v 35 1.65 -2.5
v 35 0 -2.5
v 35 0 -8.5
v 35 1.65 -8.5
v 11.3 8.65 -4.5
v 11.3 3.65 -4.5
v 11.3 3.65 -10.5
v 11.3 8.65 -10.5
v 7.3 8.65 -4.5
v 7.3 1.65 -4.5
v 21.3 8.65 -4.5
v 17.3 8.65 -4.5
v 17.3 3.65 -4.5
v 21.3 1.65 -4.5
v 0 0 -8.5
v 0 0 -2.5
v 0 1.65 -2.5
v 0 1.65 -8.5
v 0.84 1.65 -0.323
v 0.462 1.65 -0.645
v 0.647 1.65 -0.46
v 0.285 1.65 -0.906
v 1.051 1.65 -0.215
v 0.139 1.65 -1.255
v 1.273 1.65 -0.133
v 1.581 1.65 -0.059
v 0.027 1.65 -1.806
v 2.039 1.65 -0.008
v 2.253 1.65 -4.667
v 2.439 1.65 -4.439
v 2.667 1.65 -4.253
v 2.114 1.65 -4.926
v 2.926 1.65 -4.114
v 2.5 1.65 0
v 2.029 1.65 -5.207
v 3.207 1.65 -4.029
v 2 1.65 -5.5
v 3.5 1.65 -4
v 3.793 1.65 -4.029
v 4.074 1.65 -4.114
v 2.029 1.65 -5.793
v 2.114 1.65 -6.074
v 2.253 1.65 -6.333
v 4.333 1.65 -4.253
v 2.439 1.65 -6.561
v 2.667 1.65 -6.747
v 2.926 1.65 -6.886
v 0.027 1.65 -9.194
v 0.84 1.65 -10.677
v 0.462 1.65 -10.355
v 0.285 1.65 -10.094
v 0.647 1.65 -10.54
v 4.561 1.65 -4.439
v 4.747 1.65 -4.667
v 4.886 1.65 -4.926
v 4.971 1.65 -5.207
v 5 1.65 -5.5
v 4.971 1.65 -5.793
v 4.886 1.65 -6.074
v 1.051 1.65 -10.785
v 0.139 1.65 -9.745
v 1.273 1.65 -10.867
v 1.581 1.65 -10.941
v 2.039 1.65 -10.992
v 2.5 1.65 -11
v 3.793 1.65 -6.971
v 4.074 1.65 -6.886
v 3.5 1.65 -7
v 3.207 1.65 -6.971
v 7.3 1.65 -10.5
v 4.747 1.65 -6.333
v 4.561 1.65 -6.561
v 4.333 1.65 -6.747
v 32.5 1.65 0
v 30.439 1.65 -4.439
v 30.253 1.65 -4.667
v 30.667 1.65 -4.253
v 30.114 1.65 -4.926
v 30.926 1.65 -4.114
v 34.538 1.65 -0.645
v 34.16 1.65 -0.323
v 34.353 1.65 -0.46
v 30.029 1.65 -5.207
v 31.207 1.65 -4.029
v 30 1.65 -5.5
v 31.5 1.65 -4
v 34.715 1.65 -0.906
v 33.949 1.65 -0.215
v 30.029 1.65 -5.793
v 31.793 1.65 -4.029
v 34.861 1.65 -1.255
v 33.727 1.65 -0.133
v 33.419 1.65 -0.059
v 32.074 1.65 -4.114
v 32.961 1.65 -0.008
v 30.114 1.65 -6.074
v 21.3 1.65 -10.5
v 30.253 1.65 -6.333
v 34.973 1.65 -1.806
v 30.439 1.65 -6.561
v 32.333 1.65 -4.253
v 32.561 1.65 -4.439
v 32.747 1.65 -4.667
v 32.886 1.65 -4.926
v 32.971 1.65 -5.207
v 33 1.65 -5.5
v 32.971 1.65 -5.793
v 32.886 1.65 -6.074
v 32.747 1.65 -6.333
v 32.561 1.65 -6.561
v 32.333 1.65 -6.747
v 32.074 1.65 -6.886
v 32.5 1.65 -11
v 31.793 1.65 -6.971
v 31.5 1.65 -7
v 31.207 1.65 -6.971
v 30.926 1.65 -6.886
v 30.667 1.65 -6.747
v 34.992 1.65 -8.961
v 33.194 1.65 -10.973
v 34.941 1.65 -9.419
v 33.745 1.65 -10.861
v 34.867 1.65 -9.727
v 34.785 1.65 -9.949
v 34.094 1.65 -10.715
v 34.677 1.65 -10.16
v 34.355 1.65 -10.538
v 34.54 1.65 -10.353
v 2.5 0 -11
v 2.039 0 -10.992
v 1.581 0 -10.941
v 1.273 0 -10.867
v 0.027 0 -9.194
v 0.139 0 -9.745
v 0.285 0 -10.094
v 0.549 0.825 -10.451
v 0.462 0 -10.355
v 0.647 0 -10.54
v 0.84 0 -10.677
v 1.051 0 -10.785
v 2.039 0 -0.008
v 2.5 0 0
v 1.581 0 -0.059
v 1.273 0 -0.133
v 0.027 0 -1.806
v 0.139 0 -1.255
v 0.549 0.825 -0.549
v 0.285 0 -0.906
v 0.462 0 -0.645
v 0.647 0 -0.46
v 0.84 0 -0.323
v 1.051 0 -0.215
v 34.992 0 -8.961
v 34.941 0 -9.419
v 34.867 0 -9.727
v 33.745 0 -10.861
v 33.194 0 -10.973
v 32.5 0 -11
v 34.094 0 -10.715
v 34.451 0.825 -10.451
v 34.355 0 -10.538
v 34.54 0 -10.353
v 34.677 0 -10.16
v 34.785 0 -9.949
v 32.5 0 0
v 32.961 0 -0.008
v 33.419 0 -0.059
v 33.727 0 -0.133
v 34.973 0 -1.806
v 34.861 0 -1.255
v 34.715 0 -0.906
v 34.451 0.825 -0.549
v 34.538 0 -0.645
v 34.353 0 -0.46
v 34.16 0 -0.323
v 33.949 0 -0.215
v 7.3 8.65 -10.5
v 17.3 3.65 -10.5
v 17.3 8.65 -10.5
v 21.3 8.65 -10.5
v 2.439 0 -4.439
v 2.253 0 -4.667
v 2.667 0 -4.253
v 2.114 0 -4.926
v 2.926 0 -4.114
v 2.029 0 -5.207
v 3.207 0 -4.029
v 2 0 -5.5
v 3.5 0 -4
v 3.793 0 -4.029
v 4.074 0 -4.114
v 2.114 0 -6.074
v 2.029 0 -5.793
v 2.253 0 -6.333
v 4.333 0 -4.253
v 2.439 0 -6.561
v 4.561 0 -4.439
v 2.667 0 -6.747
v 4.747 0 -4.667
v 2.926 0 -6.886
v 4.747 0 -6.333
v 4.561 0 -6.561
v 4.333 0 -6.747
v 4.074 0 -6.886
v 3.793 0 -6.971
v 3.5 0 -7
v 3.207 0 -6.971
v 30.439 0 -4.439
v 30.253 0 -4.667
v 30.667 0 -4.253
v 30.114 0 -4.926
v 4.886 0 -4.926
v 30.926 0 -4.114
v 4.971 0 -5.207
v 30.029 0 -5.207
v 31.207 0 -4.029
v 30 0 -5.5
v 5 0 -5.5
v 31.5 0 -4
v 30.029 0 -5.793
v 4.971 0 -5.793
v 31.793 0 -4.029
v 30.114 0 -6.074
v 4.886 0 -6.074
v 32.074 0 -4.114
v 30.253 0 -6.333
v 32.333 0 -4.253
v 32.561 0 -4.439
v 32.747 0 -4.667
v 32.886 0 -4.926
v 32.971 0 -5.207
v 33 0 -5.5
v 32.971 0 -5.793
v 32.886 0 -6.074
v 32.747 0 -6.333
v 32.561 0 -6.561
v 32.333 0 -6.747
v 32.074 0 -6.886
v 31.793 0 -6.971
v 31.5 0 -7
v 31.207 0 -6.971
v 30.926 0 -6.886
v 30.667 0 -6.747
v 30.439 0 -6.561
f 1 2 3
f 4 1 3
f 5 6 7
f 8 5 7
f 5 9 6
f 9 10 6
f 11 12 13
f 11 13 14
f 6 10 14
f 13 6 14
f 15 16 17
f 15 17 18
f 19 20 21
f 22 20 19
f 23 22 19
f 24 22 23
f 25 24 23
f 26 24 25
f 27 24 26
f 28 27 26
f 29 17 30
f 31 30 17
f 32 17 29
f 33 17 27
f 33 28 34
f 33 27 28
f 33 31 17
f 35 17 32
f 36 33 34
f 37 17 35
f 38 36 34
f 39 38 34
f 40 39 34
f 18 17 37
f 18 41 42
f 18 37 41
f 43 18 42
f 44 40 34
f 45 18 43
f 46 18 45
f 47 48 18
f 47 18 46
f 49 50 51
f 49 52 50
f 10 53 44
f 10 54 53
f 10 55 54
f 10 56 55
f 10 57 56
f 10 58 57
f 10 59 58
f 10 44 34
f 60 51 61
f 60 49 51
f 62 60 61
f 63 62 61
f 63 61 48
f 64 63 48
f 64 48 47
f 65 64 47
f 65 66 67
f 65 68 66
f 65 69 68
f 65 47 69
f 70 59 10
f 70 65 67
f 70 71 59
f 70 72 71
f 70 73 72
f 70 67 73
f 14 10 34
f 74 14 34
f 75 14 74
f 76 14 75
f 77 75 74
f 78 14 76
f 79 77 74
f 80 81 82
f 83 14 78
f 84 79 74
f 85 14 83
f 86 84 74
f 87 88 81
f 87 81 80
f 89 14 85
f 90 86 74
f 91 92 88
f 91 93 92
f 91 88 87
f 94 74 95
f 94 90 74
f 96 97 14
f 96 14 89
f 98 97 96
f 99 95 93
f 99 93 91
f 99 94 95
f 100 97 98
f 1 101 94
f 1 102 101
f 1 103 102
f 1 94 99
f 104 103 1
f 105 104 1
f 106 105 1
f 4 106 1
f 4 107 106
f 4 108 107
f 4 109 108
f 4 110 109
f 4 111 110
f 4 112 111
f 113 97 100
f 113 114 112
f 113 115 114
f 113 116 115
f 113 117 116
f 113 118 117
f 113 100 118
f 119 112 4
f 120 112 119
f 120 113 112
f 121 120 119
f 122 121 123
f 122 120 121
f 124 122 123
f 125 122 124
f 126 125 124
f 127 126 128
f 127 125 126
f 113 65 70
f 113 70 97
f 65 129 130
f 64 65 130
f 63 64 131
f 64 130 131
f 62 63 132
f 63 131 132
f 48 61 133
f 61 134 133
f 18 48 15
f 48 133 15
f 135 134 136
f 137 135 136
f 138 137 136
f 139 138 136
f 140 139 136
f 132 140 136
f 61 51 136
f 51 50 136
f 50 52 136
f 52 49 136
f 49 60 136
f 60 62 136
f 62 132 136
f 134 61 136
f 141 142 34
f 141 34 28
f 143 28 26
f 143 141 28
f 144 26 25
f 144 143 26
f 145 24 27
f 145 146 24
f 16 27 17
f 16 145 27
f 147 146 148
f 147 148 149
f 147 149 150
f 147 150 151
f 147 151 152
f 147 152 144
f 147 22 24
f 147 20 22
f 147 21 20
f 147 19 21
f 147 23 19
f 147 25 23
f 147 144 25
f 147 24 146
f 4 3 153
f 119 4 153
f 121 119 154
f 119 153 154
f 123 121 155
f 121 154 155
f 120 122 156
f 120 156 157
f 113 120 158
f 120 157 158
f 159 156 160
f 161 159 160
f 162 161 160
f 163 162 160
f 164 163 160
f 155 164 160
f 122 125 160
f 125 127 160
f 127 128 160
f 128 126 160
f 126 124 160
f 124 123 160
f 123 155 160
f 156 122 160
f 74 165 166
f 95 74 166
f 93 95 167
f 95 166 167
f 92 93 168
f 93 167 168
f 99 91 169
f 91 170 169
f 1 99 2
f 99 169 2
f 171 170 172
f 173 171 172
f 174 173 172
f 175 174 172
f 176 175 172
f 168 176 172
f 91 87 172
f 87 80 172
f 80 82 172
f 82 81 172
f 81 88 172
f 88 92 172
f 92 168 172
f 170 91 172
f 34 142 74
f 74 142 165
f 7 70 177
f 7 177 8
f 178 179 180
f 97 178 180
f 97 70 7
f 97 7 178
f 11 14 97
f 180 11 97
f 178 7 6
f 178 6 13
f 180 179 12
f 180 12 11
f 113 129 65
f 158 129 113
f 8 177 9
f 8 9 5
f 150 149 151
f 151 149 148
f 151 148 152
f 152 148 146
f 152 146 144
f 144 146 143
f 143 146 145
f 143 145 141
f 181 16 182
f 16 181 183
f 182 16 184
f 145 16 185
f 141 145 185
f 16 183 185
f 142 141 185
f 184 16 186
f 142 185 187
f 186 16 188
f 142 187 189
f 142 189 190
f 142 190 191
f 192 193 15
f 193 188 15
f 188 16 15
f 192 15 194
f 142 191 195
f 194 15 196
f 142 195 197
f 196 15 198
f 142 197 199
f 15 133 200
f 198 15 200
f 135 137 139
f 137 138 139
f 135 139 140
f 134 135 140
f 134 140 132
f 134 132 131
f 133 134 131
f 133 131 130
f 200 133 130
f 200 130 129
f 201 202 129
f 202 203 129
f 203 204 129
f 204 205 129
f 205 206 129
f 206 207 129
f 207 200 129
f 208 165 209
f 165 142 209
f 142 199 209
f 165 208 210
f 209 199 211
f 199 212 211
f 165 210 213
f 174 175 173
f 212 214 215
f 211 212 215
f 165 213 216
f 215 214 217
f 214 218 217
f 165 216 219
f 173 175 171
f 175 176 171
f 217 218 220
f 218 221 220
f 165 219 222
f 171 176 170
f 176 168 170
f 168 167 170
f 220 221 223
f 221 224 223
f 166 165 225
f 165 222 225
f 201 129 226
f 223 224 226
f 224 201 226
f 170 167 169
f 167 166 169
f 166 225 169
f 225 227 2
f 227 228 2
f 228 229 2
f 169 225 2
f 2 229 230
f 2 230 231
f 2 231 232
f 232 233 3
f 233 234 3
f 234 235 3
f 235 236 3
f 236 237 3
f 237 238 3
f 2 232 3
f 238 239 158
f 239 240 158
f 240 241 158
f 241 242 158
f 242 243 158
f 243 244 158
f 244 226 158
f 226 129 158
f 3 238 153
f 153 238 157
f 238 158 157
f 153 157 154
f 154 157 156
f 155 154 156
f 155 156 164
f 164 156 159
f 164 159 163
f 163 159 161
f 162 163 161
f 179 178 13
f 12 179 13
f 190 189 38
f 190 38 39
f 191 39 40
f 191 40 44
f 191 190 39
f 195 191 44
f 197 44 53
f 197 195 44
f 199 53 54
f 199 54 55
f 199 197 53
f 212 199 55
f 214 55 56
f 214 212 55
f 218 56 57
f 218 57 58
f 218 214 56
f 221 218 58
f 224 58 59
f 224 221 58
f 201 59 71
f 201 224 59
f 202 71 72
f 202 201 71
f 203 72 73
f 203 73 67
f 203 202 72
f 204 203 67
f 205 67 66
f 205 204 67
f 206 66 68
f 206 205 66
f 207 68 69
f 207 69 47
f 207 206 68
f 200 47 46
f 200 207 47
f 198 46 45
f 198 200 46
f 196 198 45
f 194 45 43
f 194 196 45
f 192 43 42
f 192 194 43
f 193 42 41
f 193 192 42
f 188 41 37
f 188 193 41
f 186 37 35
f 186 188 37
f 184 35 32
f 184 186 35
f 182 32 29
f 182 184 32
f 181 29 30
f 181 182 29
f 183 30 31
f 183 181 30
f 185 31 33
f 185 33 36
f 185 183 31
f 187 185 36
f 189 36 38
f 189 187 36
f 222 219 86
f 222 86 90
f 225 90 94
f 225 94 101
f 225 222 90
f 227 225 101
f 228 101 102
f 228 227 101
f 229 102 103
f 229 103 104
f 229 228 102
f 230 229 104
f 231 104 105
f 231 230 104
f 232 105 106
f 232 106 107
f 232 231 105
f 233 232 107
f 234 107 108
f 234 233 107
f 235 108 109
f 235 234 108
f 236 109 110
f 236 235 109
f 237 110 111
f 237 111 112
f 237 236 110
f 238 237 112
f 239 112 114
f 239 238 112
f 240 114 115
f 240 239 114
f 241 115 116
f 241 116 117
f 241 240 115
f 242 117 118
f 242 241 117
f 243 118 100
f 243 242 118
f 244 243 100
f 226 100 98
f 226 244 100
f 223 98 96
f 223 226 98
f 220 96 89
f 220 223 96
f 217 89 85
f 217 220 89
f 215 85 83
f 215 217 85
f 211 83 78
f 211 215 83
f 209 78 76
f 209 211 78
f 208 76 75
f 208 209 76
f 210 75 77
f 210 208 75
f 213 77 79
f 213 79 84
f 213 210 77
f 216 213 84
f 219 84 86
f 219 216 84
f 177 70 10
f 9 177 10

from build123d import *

# Parameters (mm, degrees)
SKETCH1_W           = 35
SKETCH1_H           = 11
SKETCH1_R           = 1.5
BOSS_EXTRUDE1_DEPTH = 1.65
FILLET1_SIZE        = 2.5
BOSS_EXTRUDE2_START = 1.65
SKETCH1_3_W         = 14
SKETCH1_3_H         = 6
BOSS_EXTRUDE2_DEPTH = 2
BOSS_EXTRUDE3_START = 3.65
SKETCH1_4_W         = 4
SKETCH1_4_H         = 5
SKETCH1_4_H_2       = 1
BOSS_EXTRUDE3_DEPTH = 5


with BuildPart() as part:
    # Sketch1 → Boss-Extrude1 (new body)
    with BuildSketch(Plane(origin=(0, 0, 0), x_dir=(1, 0, 0), z_dir=(0, 1, 0))):
        with Locations((17.5, 5.5)):
            Rectangle(SKETCH1_W, SKETCH1_H)
        with Locations(Location((3.5, 5.5, 0), (0, 0, 270))):
            Circle(SKETCH1_R, mode=Mode.SUBTRACT)
        with Locations(Location((31.5, 5.5, 0), (0, 0, 270))):
            Circle(SKETCH1_R, mode=Mode.SUBTRACT)
    extrude(amount=BOSS_EXTRUDE1_DEPTH)

    # Fillet1
    # a fillet whose section is not a circle: 2.5 mm, written as the material it takes off along each edge
    with BuildSketch(Plane(origin=(0, -6.25, -11), x_dir=(1, 0, 0), z_dir=(0, 1, 0)), Plane(origin=(35, -6.25, -11), x_dir=(0, 0, 1), z_dir=(0, 1, 0)), Plane(origin=(35, -6.25, 0), x_dir=(-1, 0, 0), z_dir=(0, 1, 0))) as fillet1_piece_1:
        with BuildLine():
            add(Edge.make_bspline([(FILLET1_SIZE, 0), (FILLET1_SIZE * 0.831801948466, 0), (FILLET1_SIZE * 0.663603896932, 0), (FILLET1_SIZE * 0.292893218813, -FILLET1_SIZE * 0.0716919198361), (FILLET1_SIZE * 0.0716919198361, -FILLET1_SIZE * 0.292893218813), (0, -FILLET1_SIZE * 0.663603896932), (0, -FILLET1_SIZE * 0.831801948466), (0, -FILLET1_SIZE)], knots=[0, 0, 0, 0, 0, 0, 0.5, 0.5, 1, 1, 1, 1, 1, 1], degree=5))
            Line((0, -FILLET1_SIZE), (0, 0))
            Line((0, 0), (FILLET1_SIZE, 0))
        make_face()
    extrude(amount=14.15, mode=Mode.SUBTRACT)
    with BuildSketch(Plane(origin=(0, -6.25, 0), x_dir=(1, 0, 0), z_dir=(0, 1, 0))) as fillet1_piece_2:
        with BuildLine():
            add(Edge.make_bspline([(FILLET1_SIZE, 0), (FILLET1_SIZE * 0.831801948466, 0), (FILLET1_SIZE * 0.663603896932, 0), (FILLET1_SIZE * 0.292893218813, FILLET1_SIZE * 0.0716919198361), (FILLET1_SIZE * 0.0716919198361, FILLET1_SIZE * 0.292893218813), (0, FILLET1_SIZE * 0.663603896932), (0, FILLET1_SIZE * 0.831801948466), (0, FILLET1_SIZE)], knots=[0, 0, 0, 0, 0, 0, 0.5, 0.5, 1, 1, 1, 1, 1, 1], degree=5))
            Line((0, FILLET1_SIZE), (0, 0))
            Line((0, 0), (FILLET1_SIZE, 0))
        make_face()
    extrude(amount=14.15, mode=Mode.SUBTRACT)

    # Sketch1<3> → Boss-Extrude2 (add)
    with BuildSketch(Plane(origin=(0, 0, 0), x_dir=(1, 0, 0), z_dir=(0, 1, 0)).offset(BOSS_EXTRUDE2_START)):
        with Locations((14.3, 7.5)):
            Rectangle(SKETCH1_3_W, SKETCH1_3_H)
    extrude(amount=BOSS_EXTRUDE2_DEPTH)

    # Sketch1<4> → Boss-Extrude3 (add)
    with BuildSketch(Plane(origin=(0, 0, 0), x_dir=(1, 0, 0), z_dir=(0, 1, 0)).offset(BOSS_EXTRUDE3_START)):
        with Locations((9.3, 8)):
            Rectangle(SKETCH1_4_W, SKETCH1_4_H)
        with Locations((19.3, 8)):
            Rectangle(SKETCH1_4_W, SKETCH1_4_H)
        with Locations((9.3, 5)):
            Rectangle(SKETCH1_4_W, SKETCH1_4_H_2)
        with Locations((19.3, 5)):
            Rectangle(SKETCH1_4_W, SKETCH1_4_H_2)
    extrude(amount=BOSS_EXTRUDE3_DEPTH)


solid = part.part
